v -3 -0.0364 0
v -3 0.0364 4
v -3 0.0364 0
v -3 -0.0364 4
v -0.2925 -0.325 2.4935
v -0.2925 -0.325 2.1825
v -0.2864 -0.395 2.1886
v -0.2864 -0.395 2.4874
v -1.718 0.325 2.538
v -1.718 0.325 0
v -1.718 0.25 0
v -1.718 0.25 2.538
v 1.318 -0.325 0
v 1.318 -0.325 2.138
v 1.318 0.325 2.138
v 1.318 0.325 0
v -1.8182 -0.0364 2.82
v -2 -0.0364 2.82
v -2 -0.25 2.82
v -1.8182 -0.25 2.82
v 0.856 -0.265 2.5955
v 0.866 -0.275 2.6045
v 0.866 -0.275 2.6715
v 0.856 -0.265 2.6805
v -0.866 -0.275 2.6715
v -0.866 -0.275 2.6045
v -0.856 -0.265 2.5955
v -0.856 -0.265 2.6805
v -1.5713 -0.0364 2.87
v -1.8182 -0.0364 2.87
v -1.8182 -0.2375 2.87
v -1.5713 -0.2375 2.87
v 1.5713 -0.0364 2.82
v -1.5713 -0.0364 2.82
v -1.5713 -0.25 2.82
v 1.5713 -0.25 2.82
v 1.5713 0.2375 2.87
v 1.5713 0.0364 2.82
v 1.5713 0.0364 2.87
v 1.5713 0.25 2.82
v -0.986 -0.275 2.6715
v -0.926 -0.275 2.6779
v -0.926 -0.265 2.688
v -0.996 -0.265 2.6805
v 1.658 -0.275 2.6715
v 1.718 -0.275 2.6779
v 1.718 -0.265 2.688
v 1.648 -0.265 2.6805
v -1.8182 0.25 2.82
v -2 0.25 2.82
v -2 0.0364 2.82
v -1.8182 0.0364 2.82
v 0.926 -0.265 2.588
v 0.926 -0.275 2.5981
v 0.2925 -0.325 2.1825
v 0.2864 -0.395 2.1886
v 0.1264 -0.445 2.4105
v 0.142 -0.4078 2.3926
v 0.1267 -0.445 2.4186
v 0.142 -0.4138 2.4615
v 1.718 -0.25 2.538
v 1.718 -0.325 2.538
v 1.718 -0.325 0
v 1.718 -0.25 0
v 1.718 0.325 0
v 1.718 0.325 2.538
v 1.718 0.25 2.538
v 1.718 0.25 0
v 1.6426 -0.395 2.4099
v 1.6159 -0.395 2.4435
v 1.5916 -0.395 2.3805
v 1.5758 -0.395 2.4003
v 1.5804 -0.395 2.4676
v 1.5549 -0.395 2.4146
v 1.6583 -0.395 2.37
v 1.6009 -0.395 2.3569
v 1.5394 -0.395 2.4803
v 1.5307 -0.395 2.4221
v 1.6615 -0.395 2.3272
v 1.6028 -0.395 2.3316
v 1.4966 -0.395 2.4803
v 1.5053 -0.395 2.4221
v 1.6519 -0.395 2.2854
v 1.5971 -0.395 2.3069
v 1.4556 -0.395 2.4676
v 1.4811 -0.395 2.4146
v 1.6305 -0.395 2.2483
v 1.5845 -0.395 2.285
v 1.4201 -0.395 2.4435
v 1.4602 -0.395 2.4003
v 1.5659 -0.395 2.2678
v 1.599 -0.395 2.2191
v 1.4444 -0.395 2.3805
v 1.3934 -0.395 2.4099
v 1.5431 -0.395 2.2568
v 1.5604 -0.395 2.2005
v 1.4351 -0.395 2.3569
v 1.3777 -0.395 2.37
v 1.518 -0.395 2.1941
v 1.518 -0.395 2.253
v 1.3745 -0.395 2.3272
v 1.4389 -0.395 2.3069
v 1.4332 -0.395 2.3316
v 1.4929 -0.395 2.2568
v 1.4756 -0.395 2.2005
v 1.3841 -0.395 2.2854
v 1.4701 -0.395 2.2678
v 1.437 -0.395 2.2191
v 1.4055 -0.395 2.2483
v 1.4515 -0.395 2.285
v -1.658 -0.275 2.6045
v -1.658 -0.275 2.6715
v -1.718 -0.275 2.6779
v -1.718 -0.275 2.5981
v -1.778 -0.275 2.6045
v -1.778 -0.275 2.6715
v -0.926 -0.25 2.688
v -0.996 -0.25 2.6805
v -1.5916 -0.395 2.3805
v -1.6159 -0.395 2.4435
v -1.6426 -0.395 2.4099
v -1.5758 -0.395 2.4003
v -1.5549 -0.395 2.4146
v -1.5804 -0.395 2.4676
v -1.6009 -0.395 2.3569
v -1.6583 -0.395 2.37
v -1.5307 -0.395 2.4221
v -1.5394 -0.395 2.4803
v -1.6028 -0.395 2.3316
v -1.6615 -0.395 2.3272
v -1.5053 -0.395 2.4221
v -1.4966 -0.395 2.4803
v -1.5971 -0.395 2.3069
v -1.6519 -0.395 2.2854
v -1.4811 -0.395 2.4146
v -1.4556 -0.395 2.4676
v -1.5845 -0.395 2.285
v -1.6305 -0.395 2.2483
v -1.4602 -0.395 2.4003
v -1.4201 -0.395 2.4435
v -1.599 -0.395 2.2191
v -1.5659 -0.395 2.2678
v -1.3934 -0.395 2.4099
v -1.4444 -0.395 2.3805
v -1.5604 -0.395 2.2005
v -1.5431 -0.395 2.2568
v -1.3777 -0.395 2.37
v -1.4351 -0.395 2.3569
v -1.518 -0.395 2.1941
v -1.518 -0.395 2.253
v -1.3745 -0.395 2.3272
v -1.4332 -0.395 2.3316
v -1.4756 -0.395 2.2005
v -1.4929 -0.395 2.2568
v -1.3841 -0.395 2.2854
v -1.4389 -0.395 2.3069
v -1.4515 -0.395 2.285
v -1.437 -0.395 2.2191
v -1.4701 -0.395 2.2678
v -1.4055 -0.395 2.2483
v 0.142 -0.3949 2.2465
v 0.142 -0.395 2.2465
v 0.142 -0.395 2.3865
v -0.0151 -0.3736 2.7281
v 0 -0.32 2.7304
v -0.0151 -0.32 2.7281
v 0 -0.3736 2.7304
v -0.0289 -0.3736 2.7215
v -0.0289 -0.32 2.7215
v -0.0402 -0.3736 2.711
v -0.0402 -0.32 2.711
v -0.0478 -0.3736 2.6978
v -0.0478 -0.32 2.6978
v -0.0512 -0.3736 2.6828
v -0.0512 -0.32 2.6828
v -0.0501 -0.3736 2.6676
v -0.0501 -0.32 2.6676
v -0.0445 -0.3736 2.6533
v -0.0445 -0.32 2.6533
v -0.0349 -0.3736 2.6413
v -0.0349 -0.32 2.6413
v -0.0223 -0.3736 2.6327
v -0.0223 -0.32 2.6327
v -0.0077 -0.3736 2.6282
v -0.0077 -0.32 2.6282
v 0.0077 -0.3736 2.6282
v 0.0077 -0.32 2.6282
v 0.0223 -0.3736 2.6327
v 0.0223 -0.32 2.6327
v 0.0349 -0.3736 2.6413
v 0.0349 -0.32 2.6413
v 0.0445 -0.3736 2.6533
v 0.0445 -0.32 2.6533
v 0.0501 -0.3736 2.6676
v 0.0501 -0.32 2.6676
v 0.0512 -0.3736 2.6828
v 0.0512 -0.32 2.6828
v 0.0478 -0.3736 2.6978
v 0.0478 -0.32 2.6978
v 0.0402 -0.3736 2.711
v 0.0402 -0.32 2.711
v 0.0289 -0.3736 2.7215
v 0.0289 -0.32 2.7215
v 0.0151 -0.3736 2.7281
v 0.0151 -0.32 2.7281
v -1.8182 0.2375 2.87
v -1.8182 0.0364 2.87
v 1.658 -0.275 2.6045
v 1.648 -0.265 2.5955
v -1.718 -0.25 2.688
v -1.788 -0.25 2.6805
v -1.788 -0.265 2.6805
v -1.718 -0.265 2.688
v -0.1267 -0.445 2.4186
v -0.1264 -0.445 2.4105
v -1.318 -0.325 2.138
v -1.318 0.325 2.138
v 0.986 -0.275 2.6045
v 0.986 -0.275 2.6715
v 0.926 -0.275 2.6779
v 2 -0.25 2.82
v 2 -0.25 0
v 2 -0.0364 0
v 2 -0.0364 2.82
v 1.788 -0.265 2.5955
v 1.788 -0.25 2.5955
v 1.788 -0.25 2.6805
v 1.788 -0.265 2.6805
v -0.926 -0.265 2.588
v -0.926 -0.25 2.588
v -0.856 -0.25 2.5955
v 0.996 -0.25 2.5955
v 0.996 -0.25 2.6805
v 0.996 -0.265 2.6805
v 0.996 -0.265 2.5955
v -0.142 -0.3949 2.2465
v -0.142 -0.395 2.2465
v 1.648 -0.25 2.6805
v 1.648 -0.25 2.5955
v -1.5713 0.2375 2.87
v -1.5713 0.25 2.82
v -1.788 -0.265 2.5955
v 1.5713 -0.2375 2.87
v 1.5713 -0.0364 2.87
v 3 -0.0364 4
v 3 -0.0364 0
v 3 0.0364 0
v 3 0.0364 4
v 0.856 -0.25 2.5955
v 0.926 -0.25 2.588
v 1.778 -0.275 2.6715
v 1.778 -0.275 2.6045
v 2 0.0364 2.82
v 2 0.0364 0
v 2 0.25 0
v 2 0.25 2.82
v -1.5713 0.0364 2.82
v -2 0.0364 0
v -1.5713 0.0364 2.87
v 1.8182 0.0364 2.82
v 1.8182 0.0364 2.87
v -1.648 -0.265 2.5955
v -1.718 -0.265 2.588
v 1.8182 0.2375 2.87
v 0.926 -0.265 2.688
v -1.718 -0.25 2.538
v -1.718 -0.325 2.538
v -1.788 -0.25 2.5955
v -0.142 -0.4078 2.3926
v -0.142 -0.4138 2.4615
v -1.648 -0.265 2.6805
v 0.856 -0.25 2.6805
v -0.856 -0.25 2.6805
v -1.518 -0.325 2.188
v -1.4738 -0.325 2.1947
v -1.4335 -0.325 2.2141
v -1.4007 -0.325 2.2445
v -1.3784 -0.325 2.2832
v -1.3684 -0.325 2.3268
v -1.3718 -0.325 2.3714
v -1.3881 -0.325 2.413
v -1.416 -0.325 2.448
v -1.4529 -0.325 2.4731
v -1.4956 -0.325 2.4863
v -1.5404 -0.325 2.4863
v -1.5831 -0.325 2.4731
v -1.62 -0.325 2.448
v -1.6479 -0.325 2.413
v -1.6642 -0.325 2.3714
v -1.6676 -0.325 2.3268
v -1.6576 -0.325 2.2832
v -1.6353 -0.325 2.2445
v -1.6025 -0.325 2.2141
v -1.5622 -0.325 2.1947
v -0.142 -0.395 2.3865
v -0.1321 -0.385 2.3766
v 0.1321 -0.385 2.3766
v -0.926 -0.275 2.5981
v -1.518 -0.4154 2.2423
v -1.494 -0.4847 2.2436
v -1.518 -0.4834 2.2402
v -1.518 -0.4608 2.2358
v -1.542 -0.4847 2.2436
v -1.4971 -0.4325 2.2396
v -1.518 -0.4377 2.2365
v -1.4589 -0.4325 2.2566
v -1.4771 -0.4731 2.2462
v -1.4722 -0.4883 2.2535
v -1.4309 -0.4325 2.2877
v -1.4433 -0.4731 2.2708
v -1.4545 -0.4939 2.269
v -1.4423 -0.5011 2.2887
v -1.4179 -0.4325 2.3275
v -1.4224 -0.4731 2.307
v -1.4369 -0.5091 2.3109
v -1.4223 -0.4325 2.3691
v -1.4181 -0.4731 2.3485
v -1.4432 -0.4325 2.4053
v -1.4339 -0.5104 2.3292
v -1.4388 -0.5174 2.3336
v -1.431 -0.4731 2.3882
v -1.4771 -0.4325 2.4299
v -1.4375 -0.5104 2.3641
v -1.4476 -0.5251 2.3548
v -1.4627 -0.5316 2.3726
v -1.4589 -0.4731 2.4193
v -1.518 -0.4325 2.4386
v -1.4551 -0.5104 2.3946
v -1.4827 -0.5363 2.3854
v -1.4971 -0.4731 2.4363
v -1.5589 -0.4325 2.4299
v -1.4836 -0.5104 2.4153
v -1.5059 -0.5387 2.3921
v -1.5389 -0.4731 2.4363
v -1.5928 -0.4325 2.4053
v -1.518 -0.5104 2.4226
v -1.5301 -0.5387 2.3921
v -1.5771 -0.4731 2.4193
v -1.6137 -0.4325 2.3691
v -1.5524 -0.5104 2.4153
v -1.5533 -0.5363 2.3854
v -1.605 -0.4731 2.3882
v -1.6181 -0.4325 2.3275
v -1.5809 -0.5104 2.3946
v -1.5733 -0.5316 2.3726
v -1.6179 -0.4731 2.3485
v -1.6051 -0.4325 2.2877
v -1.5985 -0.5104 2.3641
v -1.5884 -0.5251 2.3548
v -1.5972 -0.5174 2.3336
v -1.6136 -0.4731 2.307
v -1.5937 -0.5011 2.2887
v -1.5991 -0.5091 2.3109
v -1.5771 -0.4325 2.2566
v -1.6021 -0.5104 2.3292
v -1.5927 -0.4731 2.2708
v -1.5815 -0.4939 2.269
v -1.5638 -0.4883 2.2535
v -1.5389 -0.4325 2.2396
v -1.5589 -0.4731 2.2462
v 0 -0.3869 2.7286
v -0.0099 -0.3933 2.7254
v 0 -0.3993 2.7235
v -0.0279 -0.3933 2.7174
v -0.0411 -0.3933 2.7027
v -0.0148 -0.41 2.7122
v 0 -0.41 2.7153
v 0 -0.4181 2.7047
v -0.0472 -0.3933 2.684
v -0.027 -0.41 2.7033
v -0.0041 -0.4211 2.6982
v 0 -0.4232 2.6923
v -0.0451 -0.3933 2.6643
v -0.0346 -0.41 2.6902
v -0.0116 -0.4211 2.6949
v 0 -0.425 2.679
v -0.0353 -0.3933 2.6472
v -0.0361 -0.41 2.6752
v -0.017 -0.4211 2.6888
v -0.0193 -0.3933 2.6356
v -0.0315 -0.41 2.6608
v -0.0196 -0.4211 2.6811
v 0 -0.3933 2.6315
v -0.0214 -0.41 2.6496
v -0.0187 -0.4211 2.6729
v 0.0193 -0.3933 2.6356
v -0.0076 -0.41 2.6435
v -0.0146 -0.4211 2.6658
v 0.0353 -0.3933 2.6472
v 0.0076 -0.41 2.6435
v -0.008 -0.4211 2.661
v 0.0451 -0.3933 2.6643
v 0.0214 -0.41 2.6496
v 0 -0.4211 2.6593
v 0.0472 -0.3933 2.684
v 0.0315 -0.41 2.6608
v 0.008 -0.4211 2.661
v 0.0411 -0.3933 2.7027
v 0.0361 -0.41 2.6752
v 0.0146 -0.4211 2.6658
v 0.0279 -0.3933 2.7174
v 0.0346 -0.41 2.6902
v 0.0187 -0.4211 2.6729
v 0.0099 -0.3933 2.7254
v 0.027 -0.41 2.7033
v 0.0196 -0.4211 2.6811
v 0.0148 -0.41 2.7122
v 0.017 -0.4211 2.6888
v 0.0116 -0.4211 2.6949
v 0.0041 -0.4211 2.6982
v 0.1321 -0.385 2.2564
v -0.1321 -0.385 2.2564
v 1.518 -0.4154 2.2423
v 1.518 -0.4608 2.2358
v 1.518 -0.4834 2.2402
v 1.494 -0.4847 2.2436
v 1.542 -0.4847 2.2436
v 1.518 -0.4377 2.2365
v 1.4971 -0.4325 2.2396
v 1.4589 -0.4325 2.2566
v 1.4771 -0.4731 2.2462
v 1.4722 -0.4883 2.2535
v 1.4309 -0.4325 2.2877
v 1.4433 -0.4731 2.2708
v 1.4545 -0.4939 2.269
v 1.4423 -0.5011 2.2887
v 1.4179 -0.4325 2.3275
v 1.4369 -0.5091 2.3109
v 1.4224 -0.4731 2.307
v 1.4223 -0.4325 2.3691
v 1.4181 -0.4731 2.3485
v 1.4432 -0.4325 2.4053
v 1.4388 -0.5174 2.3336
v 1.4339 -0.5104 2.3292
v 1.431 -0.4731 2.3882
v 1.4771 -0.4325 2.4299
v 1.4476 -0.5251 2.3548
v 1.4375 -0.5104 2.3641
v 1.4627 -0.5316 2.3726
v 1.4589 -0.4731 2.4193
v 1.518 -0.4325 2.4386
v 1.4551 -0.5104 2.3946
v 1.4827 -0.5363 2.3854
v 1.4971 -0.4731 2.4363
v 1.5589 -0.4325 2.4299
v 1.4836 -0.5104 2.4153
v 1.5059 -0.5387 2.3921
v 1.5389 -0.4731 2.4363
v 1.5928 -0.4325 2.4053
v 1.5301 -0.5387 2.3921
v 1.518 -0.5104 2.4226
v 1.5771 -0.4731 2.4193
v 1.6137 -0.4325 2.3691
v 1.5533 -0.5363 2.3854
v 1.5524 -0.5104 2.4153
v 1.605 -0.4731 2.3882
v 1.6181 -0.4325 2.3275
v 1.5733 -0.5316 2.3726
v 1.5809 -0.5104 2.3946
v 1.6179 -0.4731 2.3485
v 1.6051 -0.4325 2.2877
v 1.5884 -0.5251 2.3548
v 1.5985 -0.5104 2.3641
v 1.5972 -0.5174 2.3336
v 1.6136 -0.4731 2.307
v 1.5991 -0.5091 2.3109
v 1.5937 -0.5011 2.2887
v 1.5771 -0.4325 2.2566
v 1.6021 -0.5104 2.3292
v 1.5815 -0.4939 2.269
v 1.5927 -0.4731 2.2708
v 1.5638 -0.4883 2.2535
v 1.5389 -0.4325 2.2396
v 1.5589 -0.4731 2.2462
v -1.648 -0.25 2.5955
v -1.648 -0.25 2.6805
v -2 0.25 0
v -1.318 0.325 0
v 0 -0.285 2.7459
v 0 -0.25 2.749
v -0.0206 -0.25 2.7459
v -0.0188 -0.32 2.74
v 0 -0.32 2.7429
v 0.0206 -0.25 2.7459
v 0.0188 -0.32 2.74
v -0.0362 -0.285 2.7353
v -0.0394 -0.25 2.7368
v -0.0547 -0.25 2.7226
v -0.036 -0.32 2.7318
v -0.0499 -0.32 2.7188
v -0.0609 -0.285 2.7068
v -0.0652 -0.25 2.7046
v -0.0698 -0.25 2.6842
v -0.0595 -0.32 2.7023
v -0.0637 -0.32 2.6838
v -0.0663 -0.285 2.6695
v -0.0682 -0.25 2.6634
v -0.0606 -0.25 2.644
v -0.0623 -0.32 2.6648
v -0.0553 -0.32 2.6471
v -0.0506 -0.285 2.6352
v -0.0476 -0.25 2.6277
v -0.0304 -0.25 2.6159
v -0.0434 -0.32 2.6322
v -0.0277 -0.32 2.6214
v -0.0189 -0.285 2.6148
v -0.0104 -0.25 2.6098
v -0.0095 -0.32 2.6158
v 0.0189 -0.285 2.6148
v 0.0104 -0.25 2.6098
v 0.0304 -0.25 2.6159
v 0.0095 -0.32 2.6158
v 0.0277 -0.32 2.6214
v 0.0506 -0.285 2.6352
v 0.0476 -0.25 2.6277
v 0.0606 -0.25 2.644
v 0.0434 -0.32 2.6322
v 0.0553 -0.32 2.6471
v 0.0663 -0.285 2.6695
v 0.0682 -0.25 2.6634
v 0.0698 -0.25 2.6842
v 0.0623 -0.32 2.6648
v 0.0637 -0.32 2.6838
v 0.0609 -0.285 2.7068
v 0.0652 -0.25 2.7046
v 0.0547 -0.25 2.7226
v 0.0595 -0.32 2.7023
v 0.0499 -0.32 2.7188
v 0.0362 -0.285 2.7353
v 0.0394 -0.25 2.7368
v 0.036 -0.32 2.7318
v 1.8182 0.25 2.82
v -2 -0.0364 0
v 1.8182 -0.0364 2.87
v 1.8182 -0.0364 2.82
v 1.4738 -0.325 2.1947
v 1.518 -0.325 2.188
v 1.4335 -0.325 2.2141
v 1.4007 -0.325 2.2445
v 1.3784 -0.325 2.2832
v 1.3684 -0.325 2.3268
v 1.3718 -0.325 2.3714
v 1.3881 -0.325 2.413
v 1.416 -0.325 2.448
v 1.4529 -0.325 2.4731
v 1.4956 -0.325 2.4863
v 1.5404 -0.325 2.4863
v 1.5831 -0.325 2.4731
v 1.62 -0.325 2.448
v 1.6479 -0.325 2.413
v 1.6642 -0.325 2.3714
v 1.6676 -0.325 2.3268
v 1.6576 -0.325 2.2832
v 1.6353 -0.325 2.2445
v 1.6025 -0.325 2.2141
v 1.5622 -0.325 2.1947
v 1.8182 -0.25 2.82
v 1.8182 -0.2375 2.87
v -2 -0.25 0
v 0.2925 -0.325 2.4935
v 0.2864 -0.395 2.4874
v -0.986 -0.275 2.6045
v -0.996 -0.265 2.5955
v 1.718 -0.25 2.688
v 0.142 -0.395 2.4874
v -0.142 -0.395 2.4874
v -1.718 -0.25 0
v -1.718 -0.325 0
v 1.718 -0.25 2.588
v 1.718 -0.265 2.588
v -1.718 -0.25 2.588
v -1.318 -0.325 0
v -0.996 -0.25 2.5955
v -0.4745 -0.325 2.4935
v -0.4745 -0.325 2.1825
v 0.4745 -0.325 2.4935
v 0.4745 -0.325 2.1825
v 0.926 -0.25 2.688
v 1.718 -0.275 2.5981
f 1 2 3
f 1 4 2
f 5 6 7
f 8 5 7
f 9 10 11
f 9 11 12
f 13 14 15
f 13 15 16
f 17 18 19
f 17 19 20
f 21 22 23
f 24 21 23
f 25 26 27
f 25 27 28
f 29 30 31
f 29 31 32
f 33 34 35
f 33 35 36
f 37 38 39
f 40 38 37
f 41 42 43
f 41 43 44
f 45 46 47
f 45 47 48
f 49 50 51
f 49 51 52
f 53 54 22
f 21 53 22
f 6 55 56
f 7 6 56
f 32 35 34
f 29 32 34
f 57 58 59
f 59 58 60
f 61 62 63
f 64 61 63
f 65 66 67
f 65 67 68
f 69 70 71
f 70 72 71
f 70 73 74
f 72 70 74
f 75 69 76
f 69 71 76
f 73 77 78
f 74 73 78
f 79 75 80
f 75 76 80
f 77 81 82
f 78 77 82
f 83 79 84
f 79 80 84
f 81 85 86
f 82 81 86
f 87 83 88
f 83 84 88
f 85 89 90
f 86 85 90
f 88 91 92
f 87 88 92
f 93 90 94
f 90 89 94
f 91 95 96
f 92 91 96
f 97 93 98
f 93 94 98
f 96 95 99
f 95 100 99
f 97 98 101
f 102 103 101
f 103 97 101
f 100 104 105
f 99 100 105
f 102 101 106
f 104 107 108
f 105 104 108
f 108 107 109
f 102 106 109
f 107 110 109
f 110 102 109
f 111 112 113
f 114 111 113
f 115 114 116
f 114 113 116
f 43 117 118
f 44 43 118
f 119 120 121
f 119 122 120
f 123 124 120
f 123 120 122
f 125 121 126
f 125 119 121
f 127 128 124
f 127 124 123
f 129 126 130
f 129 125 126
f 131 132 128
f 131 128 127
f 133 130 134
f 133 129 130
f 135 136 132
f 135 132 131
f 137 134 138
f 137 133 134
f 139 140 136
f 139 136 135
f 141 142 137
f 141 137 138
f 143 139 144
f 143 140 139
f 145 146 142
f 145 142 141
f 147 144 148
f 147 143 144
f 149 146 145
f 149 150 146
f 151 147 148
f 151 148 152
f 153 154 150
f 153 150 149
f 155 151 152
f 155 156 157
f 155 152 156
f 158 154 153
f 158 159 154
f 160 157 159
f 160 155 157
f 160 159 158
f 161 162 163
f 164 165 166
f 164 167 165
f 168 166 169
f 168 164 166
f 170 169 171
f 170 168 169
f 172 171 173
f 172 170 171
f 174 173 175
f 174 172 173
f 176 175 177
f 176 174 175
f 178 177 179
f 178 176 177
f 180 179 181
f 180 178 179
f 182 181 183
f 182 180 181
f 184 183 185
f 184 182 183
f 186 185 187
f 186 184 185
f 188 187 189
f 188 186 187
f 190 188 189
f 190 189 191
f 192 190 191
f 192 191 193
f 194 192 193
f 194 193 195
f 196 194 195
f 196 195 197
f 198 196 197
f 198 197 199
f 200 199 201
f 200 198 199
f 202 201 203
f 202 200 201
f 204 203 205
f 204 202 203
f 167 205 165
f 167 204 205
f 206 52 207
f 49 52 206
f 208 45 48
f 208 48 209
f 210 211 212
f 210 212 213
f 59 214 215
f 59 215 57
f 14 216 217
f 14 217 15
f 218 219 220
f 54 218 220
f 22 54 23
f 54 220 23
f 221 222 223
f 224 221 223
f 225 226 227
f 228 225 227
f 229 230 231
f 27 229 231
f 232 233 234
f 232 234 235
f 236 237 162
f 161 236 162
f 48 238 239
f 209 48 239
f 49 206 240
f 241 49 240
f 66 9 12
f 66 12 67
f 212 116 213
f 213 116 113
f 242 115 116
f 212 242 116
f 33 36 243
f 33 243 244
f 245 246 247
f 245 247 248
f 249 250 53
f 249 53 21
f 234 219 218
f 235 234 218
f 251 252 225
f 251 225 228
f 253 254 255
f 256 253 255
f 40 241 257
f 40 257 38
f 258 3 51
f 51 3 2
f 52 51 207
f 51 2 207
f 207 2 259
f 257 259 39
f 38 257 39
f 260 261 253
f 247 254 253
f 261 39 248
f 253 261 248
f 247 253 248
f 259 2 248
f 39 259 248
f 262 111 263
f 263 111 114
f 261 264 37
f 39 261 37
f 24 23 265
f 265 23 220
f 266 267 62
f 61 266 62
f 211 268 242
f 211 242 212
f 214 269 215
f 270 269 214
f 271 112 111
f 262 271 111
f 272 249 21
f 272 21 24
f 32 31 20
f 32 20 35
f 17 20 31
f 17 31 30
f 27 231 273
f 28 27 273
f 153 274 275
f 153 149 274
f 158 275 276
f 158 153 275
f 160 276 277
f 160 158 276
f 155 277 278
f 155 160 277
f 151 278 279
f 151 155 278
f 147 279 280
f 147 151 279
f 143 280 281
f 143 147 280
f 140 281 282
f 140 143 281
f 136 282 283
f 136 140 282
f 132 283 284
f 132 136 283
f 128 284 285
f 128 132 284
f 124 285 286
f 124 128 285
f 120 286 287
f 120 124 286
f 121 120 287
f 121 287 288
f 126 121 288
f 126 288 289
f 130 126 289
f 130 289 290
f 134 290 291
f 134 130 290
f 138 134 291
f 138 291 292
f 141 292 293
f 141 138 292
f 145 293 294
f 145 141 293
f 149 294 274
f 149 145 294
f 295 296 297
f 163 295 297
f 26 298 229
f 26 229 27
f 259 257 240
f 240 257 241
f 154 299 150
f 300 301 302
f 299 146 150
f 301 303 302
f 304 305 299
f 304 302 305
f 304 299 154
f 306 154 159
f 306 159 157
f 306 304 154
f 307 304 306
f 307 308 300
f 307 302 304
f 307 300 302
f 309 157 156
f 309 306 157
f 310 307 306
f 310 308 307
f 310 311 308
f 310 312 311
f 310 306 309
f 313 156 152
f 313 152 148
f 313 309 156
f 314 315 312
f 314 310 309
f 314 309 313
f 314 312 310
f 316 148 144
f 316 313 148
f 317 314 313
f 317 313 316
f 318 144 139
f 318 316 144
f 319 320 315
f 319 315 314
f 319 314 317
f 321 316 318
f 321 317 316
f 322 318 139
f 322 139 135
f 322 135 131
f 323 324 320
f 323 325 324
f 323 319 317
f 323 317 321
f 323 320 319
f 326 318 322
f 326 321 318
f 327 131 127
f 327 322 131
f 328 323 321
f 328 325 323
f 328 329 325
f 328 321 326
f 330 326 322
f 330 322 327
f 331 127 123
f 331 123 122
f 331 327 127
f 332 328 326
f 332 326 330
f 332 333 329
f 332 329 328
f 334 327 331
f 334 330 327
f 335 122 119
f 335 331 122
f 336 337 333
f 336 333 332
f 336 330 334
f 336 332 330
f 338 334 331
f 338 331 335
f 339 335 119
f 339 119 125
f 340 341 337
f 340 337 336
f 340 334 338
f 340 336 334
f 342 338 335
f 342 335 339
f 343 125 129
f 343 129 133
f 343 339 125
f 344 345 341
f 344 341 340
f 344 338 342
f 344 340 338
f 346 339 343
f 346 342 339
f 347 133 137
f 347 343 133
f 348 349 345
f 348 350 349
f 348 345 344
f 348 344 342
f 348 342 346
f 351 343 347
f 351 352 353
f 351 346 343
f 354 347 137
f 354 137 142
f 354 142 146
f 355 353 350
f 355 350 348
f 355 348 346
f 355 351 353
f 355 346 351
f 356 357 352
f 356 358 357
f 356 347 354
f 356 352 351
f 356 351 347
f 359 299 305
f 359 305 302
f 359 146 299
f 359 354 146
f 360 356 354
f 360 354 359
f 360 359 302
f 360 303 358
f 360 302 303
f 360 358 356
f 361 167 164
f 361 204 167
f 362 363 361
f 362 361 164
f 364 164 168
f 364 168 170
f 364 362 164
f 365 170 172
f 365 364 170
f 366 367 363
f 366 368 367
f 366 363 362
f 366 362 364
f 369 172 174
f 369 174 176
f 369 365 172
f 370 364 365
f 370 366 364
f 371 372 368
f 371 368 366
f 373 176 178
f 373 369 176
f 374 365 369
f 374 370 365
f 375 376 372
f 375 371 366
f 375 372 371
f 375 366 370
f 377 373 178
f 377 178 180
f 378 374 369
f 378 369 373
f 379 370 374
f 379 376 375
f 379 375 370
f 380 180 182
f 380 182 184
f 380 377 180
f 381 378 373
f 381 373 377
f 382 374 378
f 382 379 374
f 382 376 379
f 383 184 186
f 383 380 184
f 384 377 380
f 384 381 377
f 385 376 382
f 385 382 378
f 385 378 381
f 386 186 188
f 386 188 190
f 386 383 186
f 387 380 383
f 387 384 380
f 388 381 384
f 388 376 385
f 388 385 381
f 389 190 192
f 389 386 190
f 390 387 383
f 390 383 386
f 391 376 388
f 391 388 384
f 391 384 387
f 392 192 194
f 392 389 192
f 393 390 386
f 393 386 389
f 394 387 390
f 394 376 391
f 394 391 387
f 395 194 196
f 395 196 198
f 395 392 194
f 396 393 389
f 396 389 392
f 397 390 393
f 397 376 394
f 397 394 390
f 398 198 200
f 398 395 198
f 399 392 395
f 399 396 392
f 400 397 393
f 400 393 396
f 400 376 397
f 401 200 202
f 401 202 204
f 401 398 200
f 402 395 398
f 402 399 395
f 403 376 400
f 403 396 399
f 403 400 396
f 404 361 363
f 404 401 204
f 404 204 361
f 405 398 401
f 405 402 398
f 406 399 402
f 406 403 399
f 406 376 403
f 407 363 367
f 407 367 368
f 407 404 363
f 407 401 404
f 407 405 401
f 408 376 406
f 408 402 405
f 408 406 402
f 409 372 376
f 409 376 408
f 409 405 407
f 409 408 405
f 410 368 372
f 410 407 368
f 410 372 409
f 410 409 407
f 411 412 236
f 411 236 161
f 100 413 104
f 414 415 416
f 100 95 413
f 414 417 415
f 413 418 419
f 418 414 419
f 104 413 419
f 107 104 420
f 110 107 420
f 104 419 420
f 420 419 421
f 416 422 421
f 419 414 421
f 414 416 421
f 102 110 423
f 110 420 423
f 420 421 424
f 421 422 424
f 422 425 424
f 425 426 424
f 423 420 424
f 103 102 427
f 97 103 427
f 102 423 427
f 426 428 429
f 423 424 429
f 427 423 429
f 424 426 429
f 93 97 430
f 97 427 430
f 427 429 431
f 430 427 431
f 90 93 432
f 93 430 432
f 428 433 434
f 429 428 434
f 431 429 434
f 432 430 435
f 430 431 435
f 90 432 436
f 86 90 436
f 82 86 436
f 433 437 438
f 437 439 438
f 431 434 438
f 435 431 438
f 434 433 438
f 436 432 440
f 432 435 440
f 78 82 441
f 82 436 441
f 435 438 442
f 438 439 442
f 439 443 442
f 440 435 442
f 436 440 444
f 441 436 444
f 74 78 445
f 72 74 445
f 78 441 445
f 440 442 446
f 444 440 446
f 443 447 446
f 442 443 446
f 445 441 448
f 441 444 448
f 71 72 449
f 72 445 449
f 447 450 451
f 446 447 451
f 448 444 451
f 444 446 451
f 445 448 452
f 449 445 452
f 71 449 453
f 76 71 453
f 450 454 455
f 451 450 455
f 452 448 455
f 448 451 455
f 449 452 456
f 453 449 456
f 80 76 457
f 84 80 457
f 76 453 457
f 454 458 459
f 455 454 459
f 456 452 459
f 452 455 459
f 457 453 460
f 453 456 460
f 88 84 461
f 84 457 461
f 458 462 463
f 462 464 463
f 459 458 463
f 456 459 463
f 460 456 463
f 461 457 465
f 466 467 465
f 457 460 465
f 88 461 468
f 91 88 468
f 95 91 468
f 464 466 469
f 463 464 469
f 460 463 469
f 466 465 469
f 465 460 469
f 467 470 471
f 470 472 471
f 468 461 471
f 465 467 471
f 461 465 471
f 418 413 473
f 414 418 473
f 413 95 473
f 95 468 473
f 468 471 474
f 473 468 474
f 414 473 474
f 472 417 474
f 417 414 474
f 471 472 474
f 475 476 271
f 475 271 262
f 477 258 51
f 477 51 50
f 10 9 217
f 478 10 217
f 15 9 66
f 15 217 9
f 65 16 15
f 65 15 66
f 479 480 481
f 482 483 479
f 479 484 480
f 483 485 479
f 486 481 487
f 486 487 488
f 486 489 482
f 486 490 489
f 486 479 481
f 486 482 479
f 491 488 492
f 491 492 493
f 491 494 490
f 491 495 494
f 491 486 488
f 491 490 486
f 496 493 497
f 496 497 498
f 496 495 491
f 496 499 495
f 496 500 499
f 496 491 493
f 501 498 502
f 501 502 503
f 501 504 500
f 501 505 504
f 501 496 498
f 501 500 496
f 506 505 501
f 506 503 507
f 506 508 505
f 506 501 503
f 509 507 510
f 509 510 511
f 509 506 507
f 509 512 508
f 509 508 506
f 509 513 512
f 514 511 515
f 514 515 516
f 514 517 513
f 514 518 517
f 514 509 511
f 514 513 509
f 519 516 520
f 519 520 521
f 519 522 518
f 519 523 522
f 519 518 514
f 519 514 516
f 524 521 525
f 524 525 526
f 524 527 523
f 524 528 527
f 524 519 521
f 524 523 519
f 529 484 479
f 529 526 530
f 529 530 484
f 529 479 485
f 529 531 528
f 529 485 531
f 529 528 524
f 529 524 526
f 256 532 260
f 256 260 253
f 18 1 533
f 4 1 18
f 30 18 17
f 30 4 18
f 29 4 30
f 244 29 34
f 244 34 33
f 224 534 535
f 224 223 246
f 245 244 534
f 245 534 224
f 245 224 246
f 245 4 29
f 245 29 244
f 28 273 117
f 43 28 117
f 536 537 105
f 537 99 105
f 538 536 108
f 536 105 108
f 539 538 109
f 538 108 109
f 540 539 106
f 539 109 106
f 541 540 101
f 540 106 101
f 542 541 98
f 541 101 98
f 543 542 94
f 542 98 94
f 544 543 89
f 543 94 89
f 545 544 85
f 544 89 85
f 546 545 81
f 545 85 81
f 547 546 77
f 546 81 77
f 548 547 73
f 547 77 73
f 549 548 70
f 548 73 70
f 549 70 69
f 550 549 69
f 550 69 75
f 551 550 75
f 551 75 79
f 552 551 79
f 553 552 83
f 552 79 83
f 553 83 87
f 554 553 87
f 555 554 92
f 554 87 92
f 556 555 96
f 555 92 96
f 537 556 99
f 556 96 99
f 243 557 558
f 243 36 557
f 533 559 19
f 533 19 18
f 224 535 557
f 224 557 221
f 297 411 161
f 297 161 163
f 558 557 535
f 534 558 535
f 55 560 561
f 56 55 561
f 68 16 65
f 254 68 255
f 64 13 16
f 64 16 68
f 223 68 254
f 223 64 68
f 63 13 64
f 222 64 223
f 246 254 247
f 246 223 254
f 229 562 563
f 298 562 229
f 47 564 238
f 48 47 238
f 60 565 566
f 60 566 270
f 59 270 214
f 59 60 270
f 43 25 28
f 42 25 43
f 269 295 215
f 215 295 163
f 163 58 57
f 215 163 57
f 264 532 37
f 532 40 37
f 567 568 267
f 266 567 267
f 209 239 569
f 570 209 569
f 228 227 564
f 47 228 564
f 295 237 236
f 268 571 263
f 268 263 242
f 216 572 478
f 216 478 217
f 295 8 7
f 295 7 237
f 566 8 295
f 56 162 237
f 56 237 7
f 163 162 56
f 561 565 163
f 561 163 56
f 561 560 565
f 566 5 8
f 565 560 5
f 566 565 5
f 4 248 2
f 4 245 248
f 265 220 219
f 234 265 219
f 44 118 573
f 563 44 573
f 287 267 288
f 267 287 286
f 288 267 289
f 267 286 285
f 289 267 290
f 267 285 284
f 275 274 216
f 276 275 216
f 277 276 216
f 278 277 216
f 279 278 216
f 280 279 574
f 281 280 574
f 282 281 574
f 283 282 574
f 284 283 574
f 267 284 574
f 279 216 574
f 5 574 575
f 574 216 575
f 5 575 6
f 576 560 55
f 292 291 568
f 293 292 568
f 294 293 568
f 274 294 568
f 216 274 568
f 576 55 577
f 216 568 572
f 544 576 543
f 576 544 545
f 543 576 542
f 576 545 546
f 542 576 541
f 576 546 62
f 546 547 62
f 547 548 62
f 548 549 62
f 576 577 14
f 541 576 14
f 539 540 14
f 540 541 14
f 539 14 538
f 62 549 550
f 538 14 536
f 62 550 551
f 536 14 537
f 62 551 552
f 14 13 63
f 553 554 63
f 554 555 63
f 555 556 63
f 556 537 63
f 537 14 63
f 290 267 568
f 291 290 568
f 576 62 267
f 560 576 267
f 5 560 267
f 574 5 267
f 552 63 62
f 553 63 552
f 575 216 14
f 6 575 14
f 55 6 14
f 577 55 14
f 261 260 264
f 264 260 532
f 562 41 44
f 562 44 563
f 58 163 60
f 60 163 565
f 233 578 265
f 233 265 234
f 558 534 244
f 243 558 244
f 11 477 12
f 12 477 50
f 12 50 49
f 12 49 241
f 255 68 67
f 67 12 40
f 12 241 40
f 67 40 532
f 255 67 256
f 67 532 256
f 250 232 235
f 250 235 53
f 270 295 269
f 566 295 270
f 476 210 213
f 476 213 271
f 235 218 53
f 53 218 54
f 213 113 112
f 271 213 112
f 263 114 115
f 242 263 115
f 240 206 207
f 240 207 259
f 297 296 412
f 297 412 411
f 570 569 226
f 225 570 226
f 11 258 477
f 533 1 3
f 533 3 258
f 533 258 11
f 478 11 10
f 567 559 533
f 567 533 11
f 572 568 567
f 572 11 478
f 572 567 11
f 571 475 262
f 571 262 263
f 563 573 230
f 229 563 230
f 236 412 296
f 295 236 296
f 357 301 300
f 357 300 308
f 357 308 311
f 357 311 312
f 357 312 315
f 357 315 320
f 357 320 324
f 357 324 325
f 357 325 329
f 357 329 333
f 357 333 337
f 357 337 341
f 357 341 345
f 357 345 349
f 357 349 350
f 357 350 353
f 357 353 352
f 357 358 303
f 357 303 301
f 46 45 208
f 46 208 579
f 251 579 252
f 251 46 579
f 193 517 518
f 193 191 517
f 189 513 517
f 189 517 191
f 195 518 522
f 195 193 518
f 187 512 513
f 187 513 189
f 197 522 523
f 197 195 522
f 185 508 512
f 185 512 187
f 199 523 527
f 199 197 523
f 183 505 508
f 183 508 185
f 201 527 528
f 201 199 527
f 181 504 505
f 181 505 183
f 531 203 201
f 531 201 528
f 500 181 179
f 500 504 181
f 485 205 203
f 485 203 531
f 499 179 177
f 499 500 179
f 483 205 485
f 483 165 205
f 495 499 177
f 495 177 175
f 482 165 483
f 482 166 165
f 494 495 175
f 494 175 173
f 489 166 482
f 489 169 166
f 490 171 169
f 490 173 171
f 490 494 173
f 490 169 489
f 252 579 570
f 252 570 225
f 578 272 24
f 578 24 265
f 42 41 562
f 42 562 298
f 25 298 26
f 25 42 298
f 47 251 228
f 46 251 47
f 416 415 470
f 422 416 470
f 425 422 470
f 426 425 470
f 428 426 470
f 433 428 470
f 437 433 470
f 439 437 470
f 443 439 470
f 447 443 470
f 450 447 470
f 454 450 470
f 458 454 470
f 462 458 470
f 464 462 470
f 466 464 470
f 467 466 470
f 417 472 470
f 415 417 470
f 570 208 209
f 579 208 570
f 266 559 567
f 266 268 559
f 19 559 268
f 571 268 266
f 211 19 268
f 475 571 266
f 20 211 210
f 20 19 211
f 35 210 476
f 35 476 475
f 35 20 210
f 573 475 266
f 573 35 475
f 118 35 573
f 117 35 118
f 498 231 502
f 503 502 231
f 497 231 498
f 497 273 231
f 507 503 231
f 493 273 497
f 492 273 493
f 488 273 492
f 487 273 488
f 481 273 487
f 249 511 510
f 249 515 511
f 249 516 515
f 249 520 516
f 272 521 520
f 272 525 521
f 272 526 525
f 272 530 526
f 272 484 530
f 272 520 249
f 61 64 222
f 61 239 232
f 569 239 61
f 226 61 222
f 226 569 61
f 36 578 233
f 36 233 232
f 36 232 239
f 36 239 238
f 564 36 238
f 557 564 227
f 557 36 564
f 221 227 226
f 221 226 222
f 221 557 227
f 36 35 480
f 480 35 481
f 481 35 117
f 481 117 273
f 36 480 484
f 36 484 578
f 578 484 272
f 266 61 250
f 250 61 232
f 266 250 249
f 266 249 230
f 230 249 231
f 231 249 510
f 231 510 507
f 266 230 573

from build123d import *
from OCP.BRepFilletAPI import BRepFilletAPI_MakeChamfer

# Parameters (mm, degrees)
SKETCH1_W                 = 4
SKETCH1_H                 = 0.65
BOSS_EXTRUDE1_DEPTH       = 2.82
CUT_EXTRUDE1_DEPTH        = 0.075
SKETCH3_W                 = 2.636
SKETCH3_H                 = 2.138
CUT_EXTRUDE2_DEPTH        = 4.517797606
BOSS_EXTRUDE2_DEPTH       = 0.025
CHAMFER1_SIZE             = 0.01
SKETCH8_W                 = 0.439976945
SKETCH8_H                 = 0.57304899
CUT_EXTRUDE3_DEPTH        = 0.04
SKETCH9_W                 = 0.585
SKETCH9_H                 = 0.311
BOSS_EXTRUDE3_DEPTH       = 0.07
CHAMFER2_SIZE             = 0.07
CHAMFER2_SIZE_2           = 0.006124206
SKETCH10_W                = 0.284
SKETCH10_H                = 0.14
CUT_EXTRUDE4_DEPTH        = 0.01
CHAMFER3_SIZE             = 0.01
SKETCH11_W                = 0.284
SKETCH11_H                = 0.100875794
BOSS_EXTRUDE4_DEPTH       = 0.05
CUT_EXTRUDE5_REACH        = 5.582
CUT_EXTRUDE6_REACH        = 5.25
SKETCH14_W                = 0.246928611
SKETCH14_H                = 0.5
BOSS_EXTRUDE5_DEPTH       = 0.05
CHAMFER4_SIZE             = 0.05
CHAMFER4_SIZE2            = 0.0124664
CHAMFER4_OF_MIRROR4_SIZE  = 0.05
CHAMFER4_OF_MIRROR4_SIZE2 = 0.0124664
BOSS_EXTRUDE6_START       = -0.25
BOSS_EXTRUDE6_DEPTH       = 0.0364325


# Some blends are built 0.0001 mm under size
with BuildPart() as part:
    # Sketch1 → Boss-Extrude1 (new body)
    with BuildSketch(Plane.XY):
        Rectangle(SKETCH1_W, SKETCH1_H)
    extrude(amount=BOSS_EXTRUDE1_DEPTH)

    # Sketch2 → Cut-Extrude1 (cut)
    with BuildSketch(Plane.XZ.offset(0.325)):
        Polygon((-2, 0), (-1.718, 0), (-1.718, 2.538), (1.718, 2.538), (1.718, 0), (2, 0), (2, 2.82), (-2, 2.82), align=None)
    cut_extrude1 = extrude(amount=-CUT_EXTRUDE1_DEPTH, mode=Mode.SUBTRACT)

    # Sketch3 → Cut-Extrude2 (cut, through all)
    with BuildSketch(Plane.XZ.offset(0.325)):
        with Locations((0, 1.069)):
            Rectangle(SKETCH3_W, SKETCH3_H)
    extrude(amount=-CUT_EXTRUDE2_DEPTH, mode=Mode.SUBTRACT)

    # Mirror1: Cut-Extrude1 across plane
    add(cut_extrude1.mirror(Plane(origin=(0, 0, 0), x_dir=(0, 0, 1), z_dir=(0, -1, 0))), mode=Mode.SUBTRACT)

    # Sketch4 → Boss-Extrude2 (add)
    with BuildSketch(Plane.XZ.offset(0.25)):
        Polygon((-1.788, 2.6805), (-1.718, 2.688), (-1.648, 2.6805), (-1.648, 2.5955), (-1.718, 2.588), (-1.788, 2.5955), align=None)
        Polygon((-0.996, 2.6805), (-0.996, 2.5955), (-0.926, 2.588), (-0.856, 2.5955), (-0.856, 2.6805), (-0.926, 2.688), align=None)
    boss_extrude2 = extrude(amount=BOSS_EXTRUDE2_DEPTH)

    # Mirror2: Boss-Extrude2 across plane
    add(boss_extrude2.mirror(Plane(origin=(0, 0, 0), x_dir=(0, 0, 1), z_dir=(1, 0, 0))))

    # Chamfer1
    chamfer1_edges = [part.edges().sort_by_distance(p)[0] for p in [
        (-0.856, -0.275, 2.638),
        (-0.891, -0.275, 2.68425),
        (1.788, -0.275, 2.638),
        (1.753, -0.275, 2.68425),
        (1.683, -0.275, 2.68425),
        (1.648, -0.275, 2.638),
        (1.683, -0.275, 2.59175),
        (1.753, -0.275, 2.59175),
        (0.961, -0.275, 2.68425),
        (0.891, -0.275, 2.68425),
        (0.856, -0.275, 2.638),
        (0.891, -0.275, 2.59175),
        (0.961, -0.275, 2.59175),
        (0.996, -0.275, 2.638),
        (-1.788, -0.275, 2.638),
        (-1.753, -0.275, 2.59175),
        (-1.683, -0.275, 2.59175),
        (-1.648, -0.275, 2.638),
        (-1.683, -0.275, 2.68425),
        (-1.753, -0.275, 2.68425),
        (-0.961, -0.275, 2.68425),
        (-0.996, -0.275, 2.638),
        (-0.961, -0.275, 2.59175),
        (-0.891, -0.275, 2.59175),
    ]]
    chamfer(chamfer1_edges, length=CHAMFER1_SIZE)

    # Sketch5 → Revolve1 (revolve)
    with BuildSketch(Plane(origin=(0, 0, 0), x_dir=(0, 0, -1), z_dir=(1, 0, 0))):
        with BuildLine():
            Line((-2.749, -0.25), (-2.742875794, -0.32))
            Line((-2.742875794, -0.32), (-2.730380956, -0.32))
            Line((-2.730380956, -0.32), (-2.730380956, -0.373619044))
            ThreePointArc((-2.730380956, -0.373619044), (-2.715331822, -0.409950867), (-2.679, -0.425))
            Line((-2.679, -0.425), (-2.679, -0.25))
            Line((-2.679, -0.25), (-2.749, -0.25))
        make_face()
    revolve(axis=Axis((0, -0.136274993, 2.679), (0, -1, 0)))

    # Sketch6 → Revolve2 (revolve)
    with BuildSketch(Plane.ZY.offset(1.518), mode=Mode.PRIVATE) as revolve2_sk:
        with BuildLine():
            Line((2.488, -0.325), (2.481875794, -0.395))
            Line((2.481875794, -0.395), (2.423, -0.395))
            ThreePointArc((2.423, -0.395), (2.428588355, -0.500546938), (2.338, -0.555))
            Line((2.338, -0.555), (2.338, -0.325))
            Line((2.338, -0.325), (2.488, -0.325))
        make_face()
    revolve2 = revolve(revolve2_sk.sketch.rotate(Axis((-1.518, -0.325, 2.338), (0, -1, 0)), 180), axis=Axis((-1.518, -0.325, 2.338), (0, -1, 0)))

    # Sketch8 → Cut-Extrude3 (cut)
    with BuildSketch(Plane(origin=(0, 0.255528239, 0.093004673), x_dir=(-1, 0, 0), z_dir=(0, -0.9396926207859105, -0.34202014332566305))):
        with Locations((1.555484276, -2.396112054)):
            Rectangle(SKETCH8_W, SKETCH8_H)
    cut_extrude3 = extrude(amount=-CUT_EXTRUDE3_DEPTH, mode=Mode.SUBTRACT)

    # Mirror3: Revolve2, Cut-Extrude3 across plane
    add(revolve2.mirror(Plane(origin=(0, 0, 0), x_dir=(0, 0, 1), z_dir=(1, 0, 0))))
    add(cut_extrude3.mirror(Plane(origin=(0, 0, 0), x_dir=(0, 0, 1), z_dir=(1, 0, 0))), mode=Mode.SUBTRACT)

    # Sketch9 → Boss-Extrude3 (add)
    with BuildSketch(Plane.XZ.offset(0.325)):
        with Locations((0, 2.338)):
            Rectangle(SKETCH9_W, SKETCH9_H)
    extrude(amount=BOSS_EXTRUDE3_DEPTH)

    # Chamfer2
    # the kernel refuses this chamfer: 0.07, 0.006124206 mm, written as the material it takes off along each edge
    with BuildSketch(Plane(origin=(-0.474474386, -0.395, 2.4935), x_dir=(0, 0.9999943799678763, 0.00335261579403213), z_dir=(1, 0, 0))) as chamfer2_piece_1_section:
        Polygon((CHAMFER2_SIZE * 0.999994379968, -CHAMFER2_SIZE * 0.00335261579403), (-CHAMFER2_SIZE_2 * 0.00335261603863, -CHAMFER2_SIZE_2 * 0.999994452926), (0, 0), align=None)
    chamfer2_piece_1 = extrude(amount=0.948948771, mode=Mode.PRIVATE)
    chamfer2_piece_1 = split(chamfer2_piece_1, bisect_by=Plane(origin=(0, -0.325, 2.492252254), z_dir=(0, -1, 0)), keep=Keep.TOP, mode=Mode.PRIVATE)
    add(chamfer2_piece_1, mode=Mode.SUBTRACT)
    with BuildSketch(Plane(origin=(0.2925, -0.395, 2.675474386), x_dir=(0.003352615794032893, 0.9999943799678763, 0), z_dir=(0, 0, -1))) as chamfer2_piece_2_section:
        Polygon((CHAMFER2_SIZE * 0.999994379968, -CHAMFER2_SIZE * 0.00335261579403), (-CHAMFER2_SIZE_2 * 0.00335261603864, -CHAMFER2_SIZE_2 * 0.999994452926), (0, 0), align=None)
    chamfer2_piece_2 = extrude(amount=0.674948771, mode=Mode.PRIVATE)
    chamfer2_piece_2 = split(chamfer2_piece_2, bisect_by=Plane(origin=(0.291252254, -0.325, 2.338), z_dir=(0, -1, 0)), keep=Keep.TOP, mode=Mode.PRIVATE)
    add(chamfer2_piece_2, mode=Mode.SUBTRACT)
    with BuildSketch(Plane(origin=(0.474474386, -0.395, 2.1825), x_dir=(0, 0.9999943799678763, -0.00335261579403213), z_dir=(-1, 0, 0))) as chamfer2_piece_3_section:
        Polygon((CHAMFER2_SIZE * 0.999994379968, -CHAMFER2_SIZE * 0.00335261579403), (-CHAMFER2_SIZE_2 * 0.00335261603863, -CHAMFER2_SIZE_2 * 0.999994452926), (0, 0), align=None)
    chamfer2_piece_3 = extrude(amount=0.948948771, mode=Mode.PRIVATE)
    chamfer2_piece_3 = split(chamfer2_piece_3, bisect_by=Plane(origin=(0, -0.325, 2.183747746), z_dir=(0, -1, 0)), keep=Keep.TOP, mode=Mode.PRIVATE)
    add(chamfer2_piece_3, mode=Mode.SUBTRACT)
    with BuildSketch(Plane(origin=(-0.2925, -0.395, 2.000525614), x_dir=(-0.003352615794032893, 0.9999943799678763, 0), z_dir=(0, 0, 1))) as chamfer2_piece_4_section:
        Polygon((CHAMFER2_SIZE * 0.999994379968, -CHAMFER2_SIZE * 0.00335261579403), (-CHAMFER2_SIZE_2 * 0.00335261603864, -CHAMFER2_SIZE_2 * 0.999994452926), (0, 0), align=None)
    chamfer2_piece_4 = extrude(amount=0.674948771, mode=Mode.PRIVATE)
    chamfer2_piece_4 = split(chamfer2_piece_4, bisect_by=Plane(origin=(-0.291252254, -0.325, 2.338), z_dir=(0, -1, 0)), keep=Keep.TOP, mode=Mode.PRIVATE)
    add(chamfer2_piece_4, mode=Mode.SUBTRACT)

    # Sketch10 → Cut-Extrude4 (cut)
    with BuildSketch(Plane.XZ.offset(0.395)):
        with Locations((0, 2.3165)):
            Rectangle(SKETCH10_W, SKETCH10_H)
    extrude(amount=-CUT_EXTRUDE4_DEPTH, mode=Mode.SUBTRACT)

    # Chamfer3
    chamfer3_edges = [part.edges().sort_by_distance(p)[0] for p in [
        (0, -0.385, 2.3865),
        (0.142, -0.385, 2.3165),
        (0, -0.385, 2.2465),
        (-0.142, -0.385, 2.3165),
    ]]
    chamfer(chamfer3_edges, length=CHAMFER3_SIZE - 0.0001)  # a hair under: the kernel refuses the full size

    # Sketch11 → Boss-Extrude4 (add)
    with BuildSketch(Plane.XZ.offset(0.395)):
        with Locations((0, 2.436937897)):
            Rectangle(SKETCH11_W, SKETCH11_H)
    extrude(amount=BOSS_EXTRUDE4_DEPTH)

    # Sketch12 → Cut-Extrude5 (cut, up to next)
    with BuildSketch(Plane(origin=(0.142, 0, 0), x_dir=(0, 0, -1), z_dir=(1, 0, 0)), mode=Mode.PRIVATE) as cut_extrude5_sk1:
        Polygon((-2.487375794, -0.445), (-2.487375794, -0.395), (-2.418578899, -0.445), align=None)
    cut_extrude5_tool1 = extrude(cut_extrude5_sk1.sketch, amount=-CUT_EXTRUDE5_REACH, mode=Mode.PRIVATE) & part.part
    # Sketch12 → Cut-Extrude5 (cut, up to next)
    with BuildSketch(Plane(origin=(0.142, 0, 0), x_dir=(0, 0, -1), z_dir=(1, 0, 0)), mode=Mode.PRIVATE) as cut_extrude5_sk2:
        Polygon((-2.3865, -0.395), (-2.410536518, -0.445), (-2.3865, -0.445), align=None)
    cut_extrude5_tool2 = extrude(cut_extrude5_sk2.sketch, amount=-CUT_EXTRUDE5_REACH, mode=Mode.PRIVATE) & part.part
    add(cut_extrude5_tool1.solids().sort_by_distance((0.142, -0.428333, 2.464443))[0], mode=Mode.SUBTRACT)
    add(cut_extrude5_tool2.solids().sort_by_distance((0.142, -0.428333, 2.394512))[0], mode=Mode.SUBTRACT)

    # Sketch13 → Cut-Extrude6 (cut, up to next)
    with BuildSketch(Plane(origin=(0, -0.218964606, 2.502776895), x_dir=(1, 0, 0), z_dir=(0, -0.08715574274765381, 0.996194698091746)), mode=Mode.PRIVATE) as cut_extrude6_sk1:
        Polygon((-0.142, -0.19770153), (-0.126414627, -0.23321454), (-0.142, -0.23321454), align=None)
    cut_extrude6_tool1 = extrude(cut_extrude6_sk1.sketch, amount=-CUT_EXTRUDE6_REACH, mode=Mode.PRIVATE) & part.part
    # Sketch13 → Cut-Extrude6 (cut, up to next)
    with BuildSketch(Plane(origin=(0, -0.218964606, 2.502776895), x_dir=(1, 0, 0), z_dir=(0, -0.08715574274765381, 0.996194698091746)), mode=Mode.PRIVATE) as cut_extrude6_sk2:
        Polygon((0.142, -0.19770153), (0.126414627, -0.23321454), (0.142, -0.23321454), align=None)
    cut_extrude6_tool2 = extrude(cut_extrude6_sk2.sketch, amount=-CUT_EXTRUDE6_REACH, mode=Mode.PRIVATE) & part.part
    add(cut_extrude6_tool1.solids().sort_by_distance((-0.136805, -0.439499, 2.483483))[0], mode=Mode.SUBTRACT)
    add(cut_extrude6_tool2.solids().sort_by_distance((0.136805, -0.439499, 2.483483))[0], mode=Mode.SUBTRACT)

    # Sketch14 → Boss-Extrude5 (add)
    with BuildSketch(Plane.XY.offset(2.82)):
        with Locations((-1.694754599, 0)):
            Rectangle(SKETCH14_W, SKETCH14_H)
    boss_extrude5 = extrude(amount=BOSS_EXTRUDE5_DEPTH)

    # Chamfer4: one chamfer whose edges measure the first distance from different faces: ONE call of the kernel's chamfer builder (chamfer() names one face for all edges)
    chamfer4_edges_1 = [part.edges().sort_by_distance(p)[0] for p in [
        (-1.694754599, 0.25, 2.87),
    ]]
    chamfer4_side_1 = [part.faces().sort_by_distance(p)[0] for p in [
        (-1.859, 0.25, 0.049230986),
    ]]
    chamfer4_edges_2 = [part.edges().sort_by_distance(p)[0] for p in [
        (-1.694754599, -0.25, 2.87),
    ]]
    chamfer4_side_2 = [part.faces().sort_by_distance(p)[0] for p in [
        (-1.859, -0.25, 0.049230986),
    ]]
    chamfer4 = BRepFilletAPI_MakeChamfer(part.part.solid().wrapped)
    for e in chamfer4_edges_1:
        chamfer4.Add(CHAMFER4_SIZE, CHAMFER4_SIZE2, e.wrapped, chamfer4_side_1[0].wrapped)  # the first distance lies on this face
    for e in chamfer4_edges_2:
        chamfer4.Add(CHAMFER4_SIZE, CHAMFER4_SIZE2, e.wrapped, chamfer4_side_2[0].wrapped)  # the first distance lies on this face
    add(Compound.cast(chamfer4.Shape()), mode=Mode.REPLACE)

    # Mirror4: Boss-Extrude5 across plane
    add(boss_extrude5.mirror(Plane(origin=(0, 0, 0), x_dir=(0, 0, 1), z_dir=(1, 0, 0))))

    # Chamfer4 of Mirror4: one chamfer whose edges measure the first distance from different faces: ONE call of the kernel's chamfer builder (chamfer() names one face for all edges)
    chamfer4_of_mirror4_edges_1 = [part.edges().sort_by_distance(p)[0] for p in [
        (1.694754599, 0.25, 2.87),
    ]]
    chamfer4_of_mirror4_side_1 = [part.faces().sort_by_distance(p)[0] for p in [
        (1.859, 0.25, 0.049230986),
    ]]
    chamfer4_of_mirror4_edges_2 = [part.edges().sort_by_distance(p)[0] for p in [
        (1.694754599, -0.25, 2.87),
    ]]
    chamfer4_of_mirror4_side_2 = [part.faces().sort_by_distance(p)[0] for p in [
        (1.859, -0.25, 0.049230986),
    ]]
    chamfer4_of_mirror4 = BRepFilletAPI_MakeChamfer(part.part.solid().wrapped)
    for e in chamfer4_of_mirror4_edges_1:
        chamfer4_of_mirror4.Add(CHAMFER4_OF_MIRROR4_SIZE, CHAMFER4_OF_MIRROR4_SIZE2, e.wrapped, chamfer4_of_mirror4_side_1[0].wrapped)  # the first distance lies on this face
    for e in chamfer4_of_mirror4_edges_2:
        chamfer4_of_mirror4.Add(CHAMFER4_OF_MIRROR4_SIZE, CHAMFER4_OF_MIRROR4_SIZE2, e.wrapped, chamfer4_of_mirror4_side_2[0].wrapped)  # the first distance lies on this face
    add(Compound.cast(chamfer4_of_mirror4.Shape()), mode=Mode.REPLACE)

    # Sketch15 → Boss-Extrude6 (add, symmetric)
    with BuildSketch(Plane.XZ.offset(0.25).offset(BOSS_EXTRUDE6_START)):
        Polygon((-3, 0), (-1.318, 0), (-1.318, 2.138), (1.318, 2.138), (1.318, 0), (3, 0), (3, 4), (-3, 4), align=None)
    extrude(amount=BOSS_EXTRUDE6_DEPTH, both=True)


solid = part.part
